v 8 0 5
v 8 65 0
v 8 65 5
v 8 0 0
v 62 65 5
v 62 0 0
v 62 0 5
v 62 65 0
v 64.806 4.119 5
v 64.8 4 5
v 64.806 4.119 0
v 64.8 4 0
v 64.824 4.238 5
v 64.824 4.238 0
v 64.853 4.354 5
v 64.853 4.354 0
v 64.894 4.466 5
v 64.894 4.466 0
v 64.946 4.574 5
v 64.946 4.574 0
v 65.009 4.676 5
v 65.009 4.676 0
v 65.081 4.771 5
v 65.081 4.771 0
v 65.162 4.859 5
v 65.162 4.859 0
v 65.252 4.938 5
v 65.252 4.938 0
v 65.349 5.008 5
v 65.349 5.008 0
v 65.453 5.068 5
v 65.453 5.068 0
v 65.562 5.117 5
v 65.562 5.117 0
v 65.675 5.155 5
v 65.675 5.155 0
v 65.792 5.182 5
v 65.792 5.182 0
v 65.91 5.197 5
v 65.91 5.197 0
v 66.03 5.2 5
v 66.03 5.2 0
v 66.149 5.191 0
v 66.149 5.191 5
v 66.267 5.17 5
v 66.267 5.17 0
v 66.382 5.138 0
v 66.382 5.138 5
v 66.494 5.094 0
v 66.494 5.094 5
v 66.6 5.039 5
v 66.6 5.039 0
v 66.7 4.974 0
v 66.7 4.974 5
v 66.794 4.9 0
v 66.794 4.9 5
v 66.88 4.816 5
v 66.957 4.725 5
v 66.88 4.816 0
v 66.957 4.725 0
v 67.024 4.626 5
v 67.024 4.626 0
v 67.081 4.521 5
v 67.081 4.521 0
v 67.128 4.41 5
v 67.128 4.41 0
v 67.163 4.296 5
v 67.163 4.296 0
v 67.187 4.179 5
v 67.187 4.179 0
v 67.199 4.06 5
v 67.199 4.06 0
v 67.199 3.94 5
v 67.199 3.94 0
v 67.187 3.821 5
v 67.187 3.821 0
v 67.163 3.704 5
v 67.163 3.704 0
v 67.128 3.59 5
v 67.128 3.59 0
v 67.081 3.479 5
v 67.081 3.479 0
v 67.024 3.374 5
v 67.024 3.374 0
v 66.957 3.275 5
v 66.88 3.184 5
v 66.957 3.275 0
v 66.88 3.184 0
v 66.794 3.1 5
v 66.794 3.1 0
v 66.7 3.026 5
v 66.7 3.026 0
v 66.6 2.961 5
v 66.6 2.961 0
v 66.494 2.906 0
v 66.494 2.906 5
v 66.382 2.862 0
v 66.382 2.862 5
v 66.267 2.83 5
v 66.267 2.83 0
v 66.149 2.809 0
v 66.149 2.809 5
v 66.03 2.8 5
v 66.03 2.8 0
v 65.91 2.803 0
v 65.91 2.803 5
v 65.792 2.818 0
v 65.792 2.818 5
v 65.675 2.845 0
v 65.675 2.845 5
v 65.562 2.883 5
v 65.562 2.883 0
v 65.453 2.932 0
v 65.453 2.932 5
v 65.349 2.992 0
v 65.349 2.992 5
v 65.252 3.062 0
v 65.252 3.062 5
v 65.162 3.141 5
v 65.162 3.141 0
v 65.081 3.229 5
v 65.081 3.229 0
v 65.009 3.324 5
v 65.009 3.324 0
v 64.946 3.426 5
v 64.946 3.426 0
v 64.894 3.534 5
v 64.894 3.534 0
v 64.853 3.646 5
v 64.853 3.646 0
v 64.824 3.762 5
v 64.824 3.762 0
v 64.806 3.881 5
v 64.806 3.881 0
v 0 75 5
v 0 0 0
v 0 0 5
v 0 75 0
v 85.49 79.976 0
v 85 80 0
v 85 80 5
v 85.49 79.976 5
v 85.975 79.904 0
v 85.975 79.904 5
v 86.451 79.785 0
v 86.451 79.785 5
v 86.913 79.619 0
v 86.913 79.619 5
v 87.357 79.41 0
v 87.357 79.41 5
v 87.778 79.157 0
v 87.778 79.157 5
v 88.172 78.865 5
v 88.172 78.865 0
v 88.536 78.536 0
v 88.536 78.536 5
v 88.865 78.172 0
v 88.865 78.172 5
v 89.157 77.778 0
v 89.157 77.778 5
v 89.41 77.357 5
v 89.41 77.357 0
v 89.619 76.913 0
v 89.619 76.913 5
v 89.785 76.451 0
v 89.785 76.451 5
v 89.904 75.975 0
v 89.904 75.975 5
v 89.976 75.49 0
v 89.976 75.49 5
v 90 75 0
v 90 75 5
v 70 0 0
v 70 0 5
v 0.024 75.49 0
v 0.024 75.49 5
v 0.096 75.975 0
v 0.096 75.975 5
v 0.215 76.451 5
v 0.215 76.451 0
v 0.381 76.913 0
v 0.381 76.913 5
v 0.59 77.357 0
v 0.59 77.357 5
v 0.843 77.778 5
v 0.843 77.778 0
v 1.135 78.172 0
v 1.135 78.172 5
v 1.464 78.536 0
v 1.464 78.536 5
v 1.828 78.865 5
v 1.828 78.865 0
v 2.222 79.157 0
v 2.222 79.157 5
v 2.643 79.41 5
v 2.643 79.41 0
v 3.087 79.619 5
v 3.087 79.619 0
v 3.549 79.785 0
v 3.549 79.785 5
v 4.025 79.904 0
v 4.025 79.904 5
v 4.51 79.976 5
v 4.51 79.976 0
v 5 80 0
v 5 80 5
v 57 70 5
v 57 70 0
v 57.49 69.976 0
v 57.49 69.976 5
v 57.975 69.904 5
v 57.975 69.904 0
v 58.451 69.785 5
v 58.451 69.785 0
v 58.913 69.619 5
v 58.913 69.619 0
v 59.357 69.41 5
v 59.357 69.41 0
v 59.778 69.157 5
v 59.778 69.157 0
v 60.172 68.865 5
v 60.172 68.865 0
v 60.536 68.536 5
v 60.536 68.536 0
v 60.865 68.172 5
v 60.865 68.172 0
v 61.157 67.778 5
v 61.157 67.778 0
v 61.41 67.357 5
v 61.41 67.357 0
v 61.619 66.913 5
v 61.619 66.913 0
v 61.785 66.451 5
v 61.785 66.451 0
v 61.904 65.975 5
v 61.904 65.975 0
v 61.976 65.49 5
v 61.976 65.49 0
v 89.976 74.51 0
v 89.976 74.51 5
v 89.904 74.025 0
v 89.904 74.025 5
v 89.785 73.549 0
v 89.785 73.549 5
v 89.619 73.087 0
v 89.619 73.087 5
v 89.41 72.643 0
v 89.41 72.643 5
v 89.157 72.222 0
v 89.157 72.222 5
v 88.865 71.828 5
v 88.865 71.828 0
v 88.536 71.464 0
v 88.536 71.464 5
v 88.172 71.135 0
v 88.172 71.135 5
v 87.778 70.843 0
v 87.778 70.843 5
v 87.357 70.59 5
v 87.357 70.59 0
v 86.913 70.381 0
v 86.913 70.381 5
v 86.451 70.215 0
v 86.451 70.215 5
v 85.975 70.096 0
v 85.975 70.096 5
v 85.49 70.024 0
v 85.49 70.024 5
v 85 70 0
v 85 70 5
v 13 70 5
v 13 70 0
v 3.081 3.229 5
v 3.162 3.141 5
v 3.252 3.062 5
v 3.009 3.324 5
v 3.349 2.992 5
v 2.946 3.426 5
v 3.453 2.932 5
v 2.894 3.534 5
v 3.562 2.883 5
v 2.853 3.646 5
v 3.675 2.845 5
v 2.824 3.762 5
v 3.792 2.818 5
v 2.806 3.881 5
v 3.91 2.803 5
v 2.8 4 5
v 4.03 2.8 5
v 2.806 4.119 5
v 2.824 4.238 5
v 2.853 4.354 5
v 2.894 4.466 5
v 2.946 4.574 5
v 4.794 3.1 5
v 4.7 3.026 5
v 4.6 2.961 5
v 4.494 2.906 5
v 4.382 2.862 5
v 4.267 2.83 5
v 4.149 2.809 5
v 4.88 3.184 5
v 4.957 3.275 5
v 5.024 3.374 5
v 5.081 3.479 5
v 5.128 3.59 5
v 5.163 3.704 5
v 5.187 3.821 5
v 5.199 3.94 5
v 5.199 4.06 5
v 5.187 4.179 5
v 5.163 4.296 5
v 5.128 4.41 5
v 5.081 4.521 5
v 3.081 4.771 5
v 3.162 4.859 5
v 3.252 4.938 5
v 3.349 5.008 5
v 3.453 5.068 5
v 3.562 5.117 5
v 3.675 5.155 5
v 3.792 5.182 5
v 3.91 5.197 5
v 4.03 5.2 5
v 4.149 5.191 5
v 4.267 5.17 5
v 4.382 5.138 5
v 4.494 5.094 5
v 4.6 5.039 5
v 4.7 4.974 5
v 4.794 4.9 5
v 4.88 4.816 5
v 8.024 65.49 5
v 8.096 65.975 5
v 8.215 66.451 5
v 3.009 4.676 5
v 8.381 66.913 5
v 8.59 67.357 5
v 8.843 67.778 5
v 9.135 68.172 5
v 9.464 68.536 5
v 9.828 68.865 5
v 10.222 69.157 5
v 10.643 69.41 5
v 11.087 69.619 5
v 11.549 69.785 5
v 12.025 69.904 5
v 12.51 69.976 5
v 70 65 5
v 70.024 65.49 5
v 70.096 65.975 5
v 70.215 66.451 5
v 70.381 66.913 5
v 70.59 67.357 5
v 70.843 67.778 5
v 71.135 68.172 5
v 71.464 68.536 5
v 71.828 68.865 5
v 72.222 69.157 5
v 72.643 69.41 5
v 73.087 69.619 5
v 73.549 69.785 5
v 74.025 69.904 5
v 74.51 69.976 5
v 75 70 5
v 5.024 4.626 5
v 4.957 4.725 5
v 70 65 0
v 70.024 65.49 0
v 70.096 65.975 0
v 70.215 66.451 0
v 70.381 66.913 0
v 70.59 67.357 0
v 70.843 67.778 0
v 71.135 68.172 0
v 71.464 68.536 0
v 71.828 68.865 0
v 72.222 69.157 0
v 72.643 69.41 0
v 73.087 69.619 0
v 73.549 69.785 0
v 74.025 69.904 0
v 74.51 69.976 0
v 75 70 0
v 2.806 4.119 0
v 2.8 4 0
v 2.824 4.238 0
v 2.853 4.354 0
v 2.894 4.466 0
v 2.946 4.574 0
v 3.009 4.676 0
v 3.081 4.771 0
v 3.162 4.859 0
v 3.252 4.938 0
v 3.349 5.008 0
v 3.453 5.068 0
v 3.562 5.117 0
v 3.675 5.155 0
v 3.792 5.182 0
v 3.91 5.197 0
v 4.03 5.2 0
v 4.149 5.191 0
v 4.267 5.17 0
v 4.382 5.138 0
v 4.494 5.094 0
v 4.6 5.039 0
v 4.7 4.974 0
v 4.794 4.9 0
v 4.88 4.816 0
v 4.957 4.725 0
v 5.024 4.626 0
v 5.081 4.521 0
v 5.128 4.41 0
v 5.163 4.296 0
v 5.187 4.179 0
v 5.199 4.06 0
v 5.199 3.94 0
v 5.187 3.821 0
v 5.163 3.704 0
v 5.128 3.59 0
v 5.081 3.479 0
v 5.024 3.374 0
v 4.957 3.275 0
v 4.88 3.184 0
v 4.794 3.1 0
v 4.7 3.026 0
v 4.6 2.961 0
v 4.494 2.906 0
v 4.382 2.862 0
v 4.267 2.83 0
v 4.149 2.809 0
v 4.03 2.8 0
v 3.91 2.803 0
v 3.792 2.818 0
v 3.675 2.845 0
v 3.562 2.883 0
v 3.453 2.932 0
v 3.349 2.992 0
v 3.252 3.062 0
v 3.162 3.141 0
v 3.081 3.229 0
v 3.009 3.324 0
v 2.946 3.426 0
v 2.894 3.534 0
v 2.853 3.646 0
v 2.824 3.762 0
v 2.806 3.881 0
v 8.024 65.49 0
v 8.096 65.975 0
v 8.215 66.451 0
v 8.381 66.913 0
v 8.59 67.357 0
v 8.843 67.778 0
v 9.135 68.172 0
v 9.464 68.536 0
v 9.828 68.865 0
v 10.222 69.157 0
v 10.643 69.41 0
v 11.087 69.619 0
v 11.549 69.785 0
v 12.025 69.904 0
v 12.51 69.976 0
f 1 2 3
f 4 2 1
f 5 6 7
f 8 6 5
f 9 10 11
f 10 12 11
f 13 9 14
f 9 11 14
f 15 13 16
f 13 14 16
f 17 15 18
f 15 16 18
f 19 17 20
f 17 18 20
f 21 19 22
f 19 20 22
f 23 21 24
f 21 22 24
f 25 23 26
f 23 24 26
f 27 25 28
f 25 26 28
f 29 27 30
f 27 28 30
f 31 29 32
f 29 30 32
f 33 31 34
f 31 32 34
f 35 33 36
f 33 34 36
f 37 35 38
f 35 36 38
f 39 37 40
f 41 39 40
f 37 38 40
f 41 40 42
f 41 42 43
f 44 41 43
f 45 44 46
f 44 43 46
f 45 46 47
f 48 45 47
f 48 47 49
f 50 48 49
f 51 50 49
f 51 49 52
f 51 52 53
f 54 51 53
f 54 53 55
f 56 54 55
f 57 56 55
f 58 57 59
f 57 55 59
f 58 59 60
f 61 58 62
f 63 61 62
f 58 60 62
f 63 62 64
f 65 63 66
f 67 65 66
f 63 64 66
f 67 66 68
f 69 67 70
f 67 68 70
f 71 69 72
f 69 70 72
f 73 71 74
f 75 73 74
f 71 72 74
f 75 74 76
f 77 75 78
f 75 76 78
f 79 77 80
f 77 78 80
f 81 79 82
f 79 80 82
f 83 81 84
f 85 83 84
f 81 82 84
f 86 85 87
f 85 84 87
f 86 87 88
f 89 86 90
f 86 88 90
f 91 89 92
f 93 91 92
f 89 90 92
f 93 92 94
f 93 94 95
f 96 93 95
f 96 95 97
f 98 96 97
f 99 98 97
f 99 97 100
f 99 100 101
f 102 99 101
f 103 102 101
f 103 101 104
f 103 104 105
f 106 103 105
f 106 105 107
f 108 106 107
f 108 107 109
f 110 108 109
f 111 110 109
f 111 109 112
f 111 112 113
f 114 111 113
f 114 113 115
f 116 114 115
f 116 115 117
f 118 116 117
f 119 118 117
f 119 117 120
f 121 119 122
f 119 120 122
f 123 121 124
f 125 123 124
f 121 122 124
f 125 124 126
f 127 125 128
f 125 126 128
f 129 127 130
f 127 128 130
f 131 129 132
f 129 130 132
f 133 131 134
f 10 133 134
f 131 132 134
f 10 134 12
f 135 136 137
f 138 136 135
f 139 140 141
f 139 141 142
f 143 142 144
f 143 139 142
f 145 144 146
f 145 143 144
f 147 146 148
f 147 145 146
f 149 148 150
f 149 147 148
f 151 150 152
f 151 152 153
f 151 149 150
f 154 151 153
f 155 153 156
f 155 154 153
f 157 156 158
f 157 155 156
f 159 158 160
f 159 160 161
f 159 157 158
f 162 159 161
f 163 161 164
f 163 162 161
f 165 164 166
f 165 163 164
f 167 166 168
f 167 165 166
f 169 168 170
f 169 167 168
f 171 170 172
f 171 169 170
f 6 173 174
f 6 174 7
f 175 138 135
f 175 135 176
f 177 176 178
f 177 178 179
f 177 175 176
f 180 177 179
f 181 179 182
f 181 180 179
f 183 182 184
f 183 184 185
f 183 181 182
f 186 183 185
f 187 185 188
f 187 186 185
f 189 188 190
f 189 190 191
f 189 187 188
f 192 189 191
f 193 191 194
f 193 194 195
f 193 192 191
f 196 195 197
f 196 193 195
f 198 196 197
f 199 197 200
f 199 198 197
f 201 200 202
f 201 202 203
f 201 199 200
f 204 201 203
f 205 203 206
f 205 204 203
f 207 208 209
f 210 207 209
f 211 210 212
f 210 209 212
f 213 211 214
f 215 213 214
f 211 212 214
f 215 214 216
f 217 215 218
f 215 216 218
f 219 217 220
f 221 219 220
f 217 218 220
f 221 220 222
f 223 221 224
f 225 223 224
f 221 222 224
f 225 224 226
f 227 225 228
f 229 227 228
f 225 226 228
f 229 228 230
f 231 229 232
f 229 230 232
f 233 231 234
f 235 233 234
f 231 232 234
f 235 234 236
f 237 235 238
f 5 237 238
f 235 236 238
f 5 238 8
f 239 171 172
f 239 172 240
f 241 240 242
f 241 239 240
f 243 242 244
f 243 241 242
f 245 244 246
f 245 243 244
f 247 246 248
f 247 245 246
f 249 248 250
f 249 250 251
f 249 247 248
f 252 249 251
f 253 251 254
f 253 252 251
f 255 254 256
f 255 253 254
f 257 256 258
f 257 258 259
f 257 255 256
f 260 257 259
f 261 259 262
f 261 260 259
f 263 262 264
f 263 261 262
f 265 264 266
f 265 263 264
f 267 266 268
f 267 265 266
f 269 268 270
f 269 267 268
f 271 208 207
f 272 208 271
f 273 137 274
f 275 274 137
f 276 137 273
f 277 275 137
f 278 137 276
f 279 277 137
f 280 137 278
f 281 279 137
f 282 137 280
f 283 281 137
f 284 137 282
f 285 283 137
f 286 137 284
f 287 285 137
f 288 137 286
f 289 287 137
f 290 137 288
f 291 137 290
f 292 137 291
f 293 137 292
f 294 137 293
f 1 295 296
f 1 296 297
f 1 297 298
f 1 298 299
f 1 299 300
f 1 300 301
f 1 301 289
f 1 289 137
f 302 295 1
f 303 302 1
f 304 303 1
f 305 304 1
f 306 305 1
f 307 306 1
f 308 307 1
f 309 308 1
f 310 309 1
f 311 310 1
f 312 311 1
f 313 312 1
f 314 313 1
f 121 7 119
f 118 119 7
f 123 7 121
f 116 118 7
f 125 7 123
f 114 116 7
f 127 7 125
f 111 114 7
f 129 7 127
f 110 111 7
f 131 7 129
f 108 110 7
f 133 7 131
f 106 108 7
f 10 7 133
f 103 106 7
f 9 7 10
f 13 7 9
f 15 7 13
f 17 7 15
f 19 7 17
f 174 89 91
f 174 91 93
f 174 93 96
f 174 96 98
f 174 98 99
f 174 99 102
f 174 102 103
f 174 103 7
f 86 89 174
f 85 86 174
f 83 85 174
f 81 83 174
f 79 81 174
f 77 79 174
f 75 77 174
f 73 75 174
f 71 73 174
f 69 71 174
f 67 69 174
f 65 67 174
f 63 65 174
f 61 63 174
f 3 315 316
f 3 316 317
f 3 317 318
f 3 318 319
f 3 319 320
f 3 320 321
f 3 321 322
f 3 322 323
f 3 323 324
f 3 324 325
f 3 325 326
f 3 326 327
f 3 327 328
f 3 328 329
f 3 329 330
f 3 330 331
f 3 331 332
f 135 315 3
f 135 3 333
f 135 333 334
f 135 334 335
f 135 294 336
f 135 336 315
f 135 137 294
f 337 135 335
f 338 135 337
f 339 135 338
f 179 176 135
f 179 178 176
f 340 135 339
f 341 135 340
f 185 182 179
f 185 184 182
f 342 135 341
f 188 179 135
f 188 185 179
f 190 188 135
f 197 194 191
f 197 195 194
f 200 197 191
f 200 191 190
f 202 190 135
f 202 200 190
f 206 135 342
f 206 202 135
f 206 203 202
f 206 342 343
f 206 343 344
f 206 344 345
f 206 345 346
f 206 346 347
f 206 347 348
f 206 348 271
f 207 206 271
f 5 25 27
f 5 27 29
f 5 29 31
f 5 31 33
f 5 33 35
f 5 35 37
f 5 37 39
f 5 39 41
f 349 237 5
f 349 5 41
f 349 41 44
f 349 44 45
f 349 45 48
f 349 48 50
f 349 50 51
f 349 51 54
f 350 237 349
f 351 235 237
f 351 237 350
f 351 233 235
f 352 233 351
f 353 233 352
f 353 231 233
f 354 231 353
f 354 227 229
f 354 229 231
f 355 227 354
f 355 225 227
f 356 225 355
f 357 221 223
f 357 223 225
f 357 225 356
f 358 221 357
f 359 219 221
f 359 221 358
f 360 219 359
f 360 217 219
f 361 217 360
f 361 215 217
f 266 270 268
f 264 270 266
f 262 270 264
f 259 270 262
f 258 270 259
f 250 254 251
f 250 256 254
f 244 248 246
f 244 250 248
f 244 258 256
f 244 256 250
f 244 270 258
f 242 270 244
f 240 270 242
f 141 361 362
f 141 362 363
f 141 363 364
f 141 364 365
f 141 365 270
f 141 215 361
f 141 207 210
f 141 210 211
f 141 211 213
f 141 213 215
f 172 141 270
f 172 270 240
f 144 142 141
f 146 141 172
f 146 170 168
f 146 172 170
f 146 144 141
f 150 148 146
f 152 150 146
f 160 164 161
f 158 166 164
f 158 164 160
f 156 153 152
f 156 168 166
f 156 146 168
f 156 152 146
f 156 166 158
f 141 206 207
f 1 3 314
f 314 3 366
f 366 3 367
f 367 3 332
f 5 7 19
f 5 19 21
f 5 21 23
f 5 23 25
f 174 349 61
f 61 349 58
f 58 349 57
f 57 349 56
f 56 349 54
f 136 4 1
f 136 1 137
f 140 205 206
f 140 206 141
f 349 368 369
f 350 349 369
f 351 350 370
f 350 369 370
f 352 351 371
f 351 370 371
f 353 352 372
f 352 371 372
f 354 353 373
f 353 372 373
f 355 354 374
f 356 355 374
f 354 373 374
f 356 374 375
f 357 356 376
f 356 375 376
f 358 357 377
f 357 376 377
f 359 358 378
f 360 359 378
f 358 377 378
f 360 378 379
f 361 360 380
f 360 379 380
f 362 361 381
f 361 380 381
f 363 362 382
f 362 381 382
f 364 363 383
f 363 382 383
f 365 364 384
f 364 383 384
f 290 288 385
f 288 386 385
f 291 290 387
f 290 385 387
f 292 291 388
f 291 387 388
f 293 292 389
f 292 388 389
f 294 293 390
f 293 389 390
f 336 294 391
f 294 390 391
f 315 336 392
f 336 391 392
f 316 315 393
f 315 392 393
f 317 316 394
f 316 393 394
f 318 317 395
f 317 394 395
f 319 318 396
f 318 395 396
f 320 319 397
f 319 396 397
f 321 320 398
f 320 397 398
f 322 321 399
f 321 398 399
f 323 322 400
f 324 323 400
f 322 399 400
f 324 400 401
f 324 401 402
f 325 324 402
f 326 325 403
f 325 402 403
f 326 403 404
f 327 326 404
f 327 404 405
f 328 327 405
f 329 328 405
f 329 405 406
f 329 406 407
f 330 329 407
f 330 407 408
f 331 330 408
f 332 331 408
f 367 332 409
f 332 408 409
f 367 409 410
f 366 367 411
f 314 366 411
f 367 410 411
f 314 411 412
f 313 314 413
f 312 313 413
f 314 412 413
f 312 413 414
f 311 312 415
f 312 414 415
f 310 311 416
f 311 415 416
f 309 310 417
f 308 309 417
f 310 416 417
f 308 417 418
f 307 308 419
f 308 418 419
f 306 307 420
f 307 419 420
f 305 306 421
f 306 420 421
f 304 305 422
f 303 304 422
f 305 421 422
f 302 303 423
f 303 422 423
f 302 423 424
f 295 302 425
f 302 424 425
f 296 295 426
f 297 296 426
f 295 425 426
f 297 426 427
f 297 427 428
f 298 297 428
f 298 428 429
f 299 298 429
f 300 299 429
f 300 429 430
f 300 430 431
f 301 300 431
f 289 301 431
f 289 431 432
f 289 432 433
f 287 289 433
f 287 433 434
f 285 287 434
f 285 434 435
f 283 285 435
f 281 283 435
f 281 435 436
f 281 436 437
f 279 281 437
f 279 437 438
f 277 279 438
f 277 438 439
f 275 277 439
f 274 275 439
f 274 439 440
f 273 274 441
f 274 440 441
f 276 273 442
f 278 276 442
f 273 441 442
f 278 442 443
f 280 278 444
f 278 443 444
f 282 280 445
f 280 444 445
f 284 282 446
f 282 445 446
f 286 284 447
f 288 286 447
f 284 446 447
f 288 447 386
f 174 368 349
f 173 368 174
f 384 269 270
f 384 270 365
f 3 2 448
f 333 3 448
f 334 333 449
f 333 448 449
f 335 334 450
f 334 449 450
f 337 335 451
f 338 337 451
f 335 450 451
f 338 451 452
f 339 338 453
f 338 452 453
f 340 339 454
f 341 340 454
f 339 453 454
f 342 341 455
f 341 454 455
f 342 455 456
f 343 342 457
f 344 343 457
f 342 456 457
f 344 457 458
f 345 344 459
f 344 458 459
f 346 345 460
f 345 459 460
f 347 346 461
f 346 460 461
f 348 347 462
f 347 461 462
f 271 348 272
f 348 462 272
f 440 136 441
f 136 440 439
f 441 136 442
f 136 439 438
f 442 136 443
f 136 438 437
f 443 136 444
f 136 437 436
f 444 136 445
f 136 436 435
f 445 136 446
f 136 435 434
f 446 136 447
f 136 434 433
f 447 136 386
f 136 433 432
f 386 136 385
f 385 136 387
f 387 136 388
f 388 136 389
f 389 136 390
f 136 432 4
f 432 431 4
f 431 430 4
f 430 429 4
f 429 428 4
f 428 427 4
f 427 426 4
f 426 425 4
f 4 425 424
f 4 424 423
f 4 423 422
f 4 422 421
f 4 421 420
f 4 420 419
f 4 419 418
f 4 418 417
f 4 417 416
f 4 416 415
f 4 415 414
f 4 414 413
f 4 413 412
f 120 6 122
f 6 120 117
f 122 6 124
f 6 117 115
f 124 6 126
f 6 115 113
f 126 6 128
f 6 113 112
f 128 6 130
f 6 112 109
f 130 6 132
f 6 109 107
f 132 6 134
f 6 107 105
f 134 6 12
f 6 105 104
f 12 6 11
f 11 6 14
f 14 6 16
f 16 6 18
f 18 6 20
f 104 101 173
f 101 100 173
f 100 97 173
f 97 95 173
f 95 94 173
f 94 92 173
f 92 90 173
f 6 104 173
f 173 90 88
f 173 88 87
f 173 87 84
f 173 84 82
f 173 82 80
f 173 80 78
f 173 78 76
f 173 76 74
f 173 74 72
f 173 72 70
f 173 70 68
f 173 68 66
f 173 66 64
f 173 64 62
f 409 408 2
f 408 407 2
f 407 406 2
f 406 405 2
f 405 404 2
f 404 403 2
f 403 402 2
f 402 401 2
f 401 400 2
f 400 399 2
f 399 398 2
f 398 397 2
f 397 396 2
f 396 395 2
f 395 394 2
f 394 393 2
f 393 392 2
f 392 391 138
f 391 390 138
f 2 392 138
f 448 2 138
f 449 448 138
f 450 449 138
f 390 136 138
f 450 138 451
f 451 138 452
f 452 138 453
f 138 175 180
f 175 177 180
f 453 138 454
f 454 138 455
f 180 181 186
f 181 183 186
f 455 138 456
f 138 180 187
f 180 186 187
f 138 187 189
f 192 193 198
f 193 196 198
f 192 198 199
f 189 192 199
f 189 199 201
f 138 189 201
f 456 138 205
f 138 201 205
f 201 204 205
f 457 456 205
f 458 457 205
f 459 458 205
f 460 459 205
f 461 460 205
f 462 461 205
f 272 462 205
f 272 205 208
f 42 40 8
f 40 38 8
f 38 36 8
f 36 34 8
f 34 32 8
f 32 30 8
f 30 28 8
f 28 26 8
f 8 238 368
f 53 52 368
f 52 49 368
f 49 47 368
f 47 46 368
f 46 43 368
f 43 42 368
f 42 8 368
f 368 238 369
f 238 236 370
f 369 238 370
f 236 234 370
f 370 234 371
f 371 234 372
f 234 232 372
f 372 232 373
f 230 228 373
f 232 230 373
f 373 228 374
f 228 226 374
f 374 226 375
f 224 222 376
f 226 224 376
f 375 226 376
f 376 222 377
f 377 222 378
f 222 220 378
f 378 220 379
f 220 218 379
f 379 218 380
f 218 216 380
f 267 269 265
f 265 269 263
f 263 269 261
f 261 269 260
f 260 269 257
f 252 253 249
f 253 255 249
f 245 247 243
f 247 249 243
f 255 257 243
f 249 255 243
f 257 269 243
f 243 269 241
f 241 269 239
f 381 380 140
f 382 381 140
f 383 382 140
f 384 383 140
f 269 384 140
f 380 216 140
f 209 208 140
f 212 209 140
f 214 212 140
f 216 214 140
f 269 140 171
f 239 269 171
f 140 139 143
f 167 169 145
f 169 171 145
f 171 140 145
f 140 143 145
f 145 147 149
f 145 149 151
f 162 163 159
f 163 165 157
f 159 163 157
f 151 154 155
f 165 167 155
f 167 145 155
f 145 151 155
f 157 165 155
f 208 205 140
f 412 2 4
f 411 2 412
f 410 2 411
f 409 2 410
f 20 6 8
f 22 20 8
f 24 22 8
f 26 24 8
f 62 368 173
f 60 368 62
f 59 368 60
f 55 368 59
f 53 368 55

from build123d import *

# Parameters (mm, degrees)
ESQUISSE1_R          = 1
BOSS_EXTRU_1_DEPTH   = 5
D_GAGEMENT_M21_D     = 2.4
D_GAGEMENT_M21_DEPTH = 5
D_GAGEMENT_M21_TIP   = 0.721032743
CONG_1_START         = -1
CONG_1_DEPTH         = 7
CONG_1_2_DEPTH       = 5


with BuildPart() as part:
    # Esquisse1 → Boss.-Extru.1 (new body)
    with BuildSketch(Plane.XY):
        Polygon((0, 0), (0, 80), (90, 80), (90, 70), (70, 70), (70, 0), (62, 0), (62, 70), (8, 70), (8, 0), align=None)
        with Locations((4, 4)):
            Circle(ESQUISSE1_R, mode=Mode.SUBTRACT)
        with Locations((66, 4)):
            Circle(ESQUISSE1_R, mode=Mode.SUBTRACT)
    extrude(amount=BOSS_EXTRU_1_DEPTH)

    # Dégagement M21
    with Locations(Plane.XY.offset(5)):
        with Locations((4, 4), (66, 4)):
            Hole(D_GAGEMENT_M21_D / 2, depth=D_GAGEMENT_M21_DEPTH)
            with Locations((0, 0, -(D_GAGEMENT_M21_DEPTH + D_GAGEMENT_M21_TIP / 2))):  # 118° drill point
                Cone(0, D_GAGEMENT_M21_D / 2, D_GAGEMENT_M21_TIP, mode=Mode.SUBTRACT)

    # Congé1: read off the stored shape, not the designer's step
    # Congé1 outline → Congé1 (cut)
    with BuildSketch(Plane.XY.offset(CONG_1_START)):
        with BuildLine():
            Line((0, 80), (0, 75))
            ThreePointArc((0, 75), (1.464466094, 78.535533906), (5, 80))
            Line((5, 80), (0, 80))
        make_face()
        with BuildLine():
            Line((90, 70), (90, 75))
            ThreePointArc((90, 75), (88.535533906, 71.464466094), (85, 70))
            Line((85, 70), (90, 70))
        make_face()
        with BuildLine():
            Line((90, 80), (85, 80))
            ThreePointArc((85, 80), (88.535533906, 78.535533906), (90, 75))
            Line((90, 75), (90, 80))
        make_face()
    extrude(amount=CONG_1_DEPTH, mode=Mode.SUBTRACT)

    # Cong_1 2 outline → Cong_1 2 (add)
    with BuildSketch(Plane.XY):
        with BuildLine():
            ThreePointArc((70, 65), (71.464466094, 68.535533906), (75, 70))
            Line((75, 70), (70, 70))
            Line((70, 70), (70, 65))
        make_face()
        with BuildLine():
            ThreePointArc((8, 65), (9.464466094, 68.535533906), (13, 70))
            Line((13, 70), (8, 70))
            Line((8, 70), (8, 65))
        make_face()
        with BuildLine():
            ThreePointArc((57, 70), (60.535533906, 68.535533906), (62, 65))
            Line((62, 65), (62, 70))
            Line((62, 70), (57, 70))
        make_face()
    extrude(amount=CONG_1_2_DEPTH)


solid = part.part
